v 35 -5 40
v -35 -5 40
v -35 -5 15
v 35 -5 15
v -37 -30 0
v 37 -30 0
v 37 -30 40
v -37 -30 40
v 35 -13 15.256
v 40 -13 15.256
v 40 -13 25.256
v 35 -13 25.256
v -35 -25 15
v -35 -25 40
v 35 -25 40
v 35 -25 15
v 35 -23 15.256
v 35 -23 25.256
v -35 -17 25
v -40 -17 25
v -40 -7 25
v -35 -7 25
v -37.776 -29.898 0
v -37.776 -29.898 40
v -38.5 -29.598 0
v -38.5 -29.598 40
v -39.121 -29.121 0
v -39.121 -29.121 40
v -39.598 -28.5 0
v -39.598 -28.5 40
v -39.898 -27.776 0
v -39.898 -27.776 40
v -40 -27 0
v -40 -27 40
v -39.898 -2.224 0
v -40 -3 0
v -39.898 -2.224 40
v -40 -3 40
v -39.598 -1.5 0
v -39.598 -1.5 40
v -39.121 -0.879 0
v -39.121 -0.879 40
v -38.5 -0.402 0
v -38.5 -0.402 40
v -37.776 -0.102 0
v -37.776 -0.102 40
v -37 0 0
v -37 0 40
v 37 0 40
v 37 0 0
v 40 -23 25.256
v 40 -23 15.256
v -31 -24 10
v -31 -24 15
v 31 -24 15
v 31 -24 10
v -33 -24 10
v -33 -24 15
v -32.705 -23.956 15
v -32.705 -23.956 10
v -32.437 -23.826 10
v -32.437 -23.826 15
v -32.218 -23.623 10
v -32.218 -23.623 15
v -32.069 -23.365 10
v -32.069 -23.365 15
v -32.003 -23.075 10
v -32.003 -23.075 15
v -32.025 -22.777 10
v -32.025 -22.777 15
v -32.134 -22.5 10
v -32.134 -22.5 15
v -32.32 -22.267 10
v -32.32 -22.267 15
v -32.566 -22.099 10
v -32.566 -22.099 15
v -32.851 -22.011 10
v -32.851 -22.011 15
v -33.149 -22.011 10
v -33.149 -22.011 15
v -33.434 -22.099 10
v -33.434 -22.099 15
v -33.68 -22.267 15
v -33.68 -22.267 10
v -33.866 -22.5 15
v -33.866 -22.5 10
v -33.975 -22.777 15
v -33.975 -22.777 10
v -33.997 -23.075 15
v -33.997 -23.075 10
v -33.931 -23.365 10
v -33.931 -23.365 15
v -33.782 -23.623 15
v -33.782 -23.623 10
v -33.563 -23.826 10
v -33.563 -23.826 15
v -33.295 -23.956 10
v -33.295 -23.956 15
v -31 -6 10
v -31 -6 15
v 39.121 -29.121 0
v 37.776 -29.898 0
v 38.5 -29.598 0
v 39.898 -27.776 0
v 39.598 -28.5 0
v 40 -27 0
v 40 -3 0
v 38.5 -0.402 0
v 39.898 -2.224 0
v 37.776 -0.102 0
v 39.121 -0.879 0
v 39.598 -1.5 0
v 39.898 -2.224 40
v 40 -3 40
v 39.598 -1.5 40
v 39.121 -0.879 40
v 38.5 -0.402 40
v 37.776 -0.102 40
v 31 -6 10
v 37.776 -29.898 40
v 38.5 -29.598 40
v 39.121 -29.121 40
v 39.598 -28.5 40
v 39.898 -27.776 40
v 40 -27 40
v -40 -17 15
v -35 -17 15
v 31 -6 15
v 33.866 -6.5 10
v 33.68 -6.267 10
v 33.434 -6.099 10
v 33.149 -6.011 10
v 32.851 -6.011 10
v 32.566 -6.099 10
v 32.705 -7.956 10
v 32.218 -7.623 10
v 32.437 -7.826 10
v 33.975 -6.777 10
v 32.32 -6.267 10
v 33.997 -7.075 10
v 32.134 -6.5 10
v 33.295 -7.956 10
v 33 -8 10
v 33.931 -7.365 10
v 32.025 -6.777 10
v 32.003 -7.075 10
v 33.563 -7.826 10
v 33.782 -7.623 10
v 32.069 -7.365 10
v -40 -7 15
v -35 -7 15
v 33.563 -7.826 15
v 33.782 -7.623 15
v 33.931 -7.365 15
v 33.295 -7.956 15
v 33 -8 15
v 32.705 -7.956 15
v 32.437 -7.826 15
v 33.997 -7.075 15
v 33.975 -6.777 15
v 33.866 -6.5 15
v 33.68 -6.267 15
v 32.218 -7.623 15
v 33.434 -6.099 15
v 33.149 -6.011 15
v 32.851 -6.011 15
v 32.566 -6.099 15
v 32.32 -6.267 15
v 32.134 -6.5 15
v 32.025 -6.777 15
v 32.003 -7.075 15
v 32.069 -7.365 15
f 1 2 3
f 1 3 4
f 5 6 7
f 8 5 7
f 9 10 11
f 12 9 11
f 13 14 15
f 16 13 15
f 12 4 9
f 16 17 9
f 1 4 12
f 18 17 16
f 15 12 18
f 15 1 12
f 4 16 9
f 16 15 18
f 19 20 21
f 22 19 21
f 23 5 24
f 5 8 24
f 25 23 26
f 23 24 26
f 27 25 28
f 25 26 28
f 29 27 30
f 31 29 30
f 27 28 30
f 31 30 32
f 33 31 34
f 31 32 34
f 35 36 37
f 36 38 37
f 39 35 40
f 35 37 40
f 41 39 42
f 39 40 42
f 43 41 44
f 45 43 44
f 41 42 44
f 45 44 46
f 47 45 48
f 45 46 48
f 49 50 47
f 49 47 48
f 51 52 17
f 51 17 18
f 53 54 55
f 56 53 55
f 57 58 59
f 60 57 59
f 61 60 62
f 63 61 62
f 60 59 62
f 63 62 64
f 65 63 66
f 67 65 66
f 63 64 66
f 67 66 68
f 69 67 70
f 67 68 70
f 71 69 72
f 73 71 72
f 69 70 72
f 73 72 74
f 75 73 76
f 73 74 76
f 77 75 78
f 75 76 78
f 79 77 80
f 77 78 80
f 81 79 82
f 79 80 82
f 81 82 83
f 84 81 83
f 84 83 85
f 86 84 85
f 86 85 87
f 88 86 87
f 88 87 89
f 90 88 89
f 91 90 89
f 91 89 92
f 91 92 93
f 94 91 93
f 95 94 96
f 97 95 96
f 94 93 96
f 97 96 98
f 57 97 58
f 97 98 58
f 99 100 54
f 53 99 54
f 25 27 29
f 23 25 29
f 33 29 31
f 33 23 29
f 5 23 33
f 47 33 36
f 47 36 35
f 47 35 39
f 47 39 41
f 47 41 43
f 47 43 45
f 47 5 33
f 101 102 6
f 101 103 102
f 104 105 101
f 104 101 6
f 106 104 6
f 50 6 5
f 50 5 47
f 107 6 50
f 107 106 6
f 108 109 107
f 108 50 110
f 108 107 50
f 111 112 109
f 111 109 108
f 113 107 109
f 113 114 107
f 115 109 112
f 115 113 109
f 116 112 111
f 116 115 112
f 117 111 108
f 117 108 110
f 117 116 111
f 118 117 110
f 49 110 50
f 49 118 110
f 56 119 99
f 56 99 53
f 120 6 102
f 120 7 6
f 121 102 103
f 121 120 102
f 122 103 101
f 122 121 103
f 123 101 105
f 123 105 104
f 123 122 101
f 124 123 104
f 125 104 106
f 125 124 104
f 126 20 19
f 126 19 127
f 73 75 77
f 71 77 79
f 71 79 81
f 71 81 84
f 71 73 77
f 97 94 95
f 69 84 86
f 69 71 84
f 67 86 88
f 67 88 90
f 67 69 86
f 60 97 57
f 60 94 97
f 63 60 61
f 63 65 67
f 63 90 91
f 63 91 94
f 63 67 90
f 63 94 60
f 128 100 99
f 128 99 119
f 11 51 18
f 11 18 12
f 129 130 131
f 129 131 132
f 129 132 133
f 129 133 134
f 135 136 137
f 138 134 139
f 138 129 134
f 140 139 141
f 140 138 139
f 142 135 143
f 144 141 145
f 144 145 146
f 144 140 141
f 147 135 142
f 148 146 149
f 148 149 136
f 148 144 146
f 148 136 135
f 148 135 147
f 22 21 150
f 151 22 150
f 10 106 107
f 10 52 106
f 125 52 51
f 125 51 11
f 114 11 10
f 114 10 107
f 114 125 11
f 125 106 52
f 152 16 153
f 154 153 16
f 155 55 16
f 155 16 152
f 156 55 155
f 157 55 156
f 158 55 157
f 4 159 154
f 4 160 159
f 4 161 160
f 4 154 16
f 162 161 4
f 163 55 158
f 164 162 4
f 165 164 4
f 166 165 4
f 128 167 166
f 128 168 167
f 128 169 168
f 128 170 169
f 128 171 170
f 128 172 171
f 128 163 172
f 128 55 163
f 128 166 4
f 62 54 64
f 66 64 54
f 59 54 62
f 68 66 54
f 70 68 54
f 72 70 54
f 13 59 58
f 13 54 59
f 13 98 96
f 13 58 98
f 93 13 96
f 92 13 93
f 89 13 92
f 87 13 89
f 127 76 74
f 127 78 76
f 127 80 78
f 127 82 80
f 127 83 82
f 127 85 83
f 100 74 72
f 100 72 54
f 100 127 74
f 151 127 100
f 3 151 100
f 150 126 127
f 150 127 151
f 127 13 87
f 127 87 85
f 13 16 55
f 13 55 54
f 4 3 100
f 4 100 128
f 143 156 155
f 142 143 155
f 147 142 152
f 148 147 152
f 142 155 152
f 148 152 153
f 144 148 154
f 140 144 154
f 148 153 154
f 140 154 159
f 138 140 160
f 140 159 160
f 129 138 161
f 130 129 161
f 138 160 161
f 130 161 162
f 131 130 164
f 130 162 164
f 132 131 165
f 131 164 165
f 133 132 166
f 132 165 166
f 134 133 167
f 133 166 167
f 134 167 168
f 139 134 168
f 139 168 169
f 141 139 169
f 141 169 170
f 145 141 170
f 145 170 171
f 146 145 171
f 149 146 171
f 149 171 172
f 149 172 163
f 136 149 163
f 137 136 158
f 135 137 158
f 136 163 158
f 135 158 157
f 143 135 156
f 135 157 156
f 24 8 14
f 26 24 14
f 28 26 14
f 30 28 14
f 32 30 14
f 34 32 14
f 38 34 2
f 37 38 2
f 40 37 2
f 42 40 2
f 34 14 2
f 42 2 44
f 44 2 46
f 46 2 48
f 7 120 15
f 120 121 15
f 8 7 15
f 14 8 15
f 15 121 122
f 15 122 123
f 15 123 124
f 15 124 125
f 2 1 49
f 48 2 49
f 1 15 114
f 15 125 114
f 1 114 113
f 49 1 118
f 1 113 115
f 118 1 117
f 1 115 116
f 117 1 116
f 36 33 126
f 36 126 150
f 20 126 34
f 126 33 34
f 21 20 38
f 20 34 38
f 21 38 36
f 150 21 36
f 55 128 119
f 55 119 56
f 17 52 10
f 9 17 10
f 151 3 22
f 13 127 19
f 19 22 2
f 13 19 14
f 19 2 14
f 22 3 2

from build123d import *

# Parameters (mm, degrees)
SKETCH_W        = 30
SKETCH_H        = 40
PAD_DEPTH       = 40
SKETCH001_W     = 20
SKETCH001_H     = 70
POCKET_DEPTH    = 25
SKETCH002_W     = 18
SKETCH002_H     = 62
POCKET001_DEPTH = 5
SKETCH003_R     = 1
POCKET002_DEPTH = 5
SKETCH004_W     = 10
SKETCH004_H     = 10
POCKET003_DEPTH = 5
SKETCH005_W     = 10
SKETCH005_H     = 10
POCKET004_DEPTH = 5
FILLET_R        = 3


with BuildPart() as part:
    # Sketch → Pad (new body, symmetric)
    with BuildSketch(Plane.YZ):
        with Locations((-15, 20)):
            Rectangle(SKETCH_W, SKETCH_H)
    extrude(amount=PAD_DEPTH, both=True)

    # Sketch001 (on Face1 of Pad) → Pocket (cut)
    with BuildSketch(Plane(origin=(0, 0, 40), x_dir=(0, -1, 0), z_dir=(0, 0, 1))):
        with Locations((15, 0)):
            Rectangle(SKETCH001_W, SKETCH001_H)
    extrude(amount=-POCKET_DEPTH, mode=Mode.SUBTRACT)

    # Sketch002 (on Face11 of Pocket) → Pocket001 (cut)
    with BuildSketch(Plane(origin=(0, 0, 15), x_dir=(0, -1, 0), z_dir=(0, 0, 1))):
        with Locations((15, 0)):
            Rectangle(SKETCH002_W, SKETCH002_H)
    extrude(amount=-POCKET001_DEPTH, mode=Mode.SUBTRACT)

    # Sketch003 (on Face11 of Pocket001) → Pocket002 (cut)
    with BuildSketch(Plane(origin=(0, 0, 15), x_dir=(0, -1, 0), z_dir=(0, 0, 1))):
        with Locations((7, 33)):
            Circle(SKETCH003_R)
        with Locations((23, -33)):
            Circle(SKETCH003_R)
    extrude(amount=-POCKET002_DEPTH, mode=Mode.SUBTRACT)

    # Sketch004 (on Face3 of Pocket002) → Pocket003 (cut)
    with BuildSketch(Plane(origin=(-40, 0, 0), x_dir=(0, 1, 0), z_dir=(-1, 0, 0))):
        with Locations((-12, -20)):
            Rectangle(SKETCH004_W, SKETCH004_H)
    extrude(amount=-POCKET003_DEPTH, mode=Mode.SUBTRACT)

    # Sketch005 → Pocket004 (cut)
    with BuildSketch(Plane.YZ.offset(40)):
        with Locations((-18, 20.255899)):
            Rectangle(SKETCH005_W, SKETCH005_H)
    extrude(amount=-POCKET004_DEPTH, mode=Mode.SUBTRACT)

    # Fillet
    fillet_edges = [part.edges().sort_by_distance(p)[0] for p in [
        (40, -30, 20),
        (40, 0, 20),
        (-40, 0, 20),
        (-40, -30, 20),
    ]]
    fillet(fillet_edges, radius=FILLET_R)


solid = part.part
